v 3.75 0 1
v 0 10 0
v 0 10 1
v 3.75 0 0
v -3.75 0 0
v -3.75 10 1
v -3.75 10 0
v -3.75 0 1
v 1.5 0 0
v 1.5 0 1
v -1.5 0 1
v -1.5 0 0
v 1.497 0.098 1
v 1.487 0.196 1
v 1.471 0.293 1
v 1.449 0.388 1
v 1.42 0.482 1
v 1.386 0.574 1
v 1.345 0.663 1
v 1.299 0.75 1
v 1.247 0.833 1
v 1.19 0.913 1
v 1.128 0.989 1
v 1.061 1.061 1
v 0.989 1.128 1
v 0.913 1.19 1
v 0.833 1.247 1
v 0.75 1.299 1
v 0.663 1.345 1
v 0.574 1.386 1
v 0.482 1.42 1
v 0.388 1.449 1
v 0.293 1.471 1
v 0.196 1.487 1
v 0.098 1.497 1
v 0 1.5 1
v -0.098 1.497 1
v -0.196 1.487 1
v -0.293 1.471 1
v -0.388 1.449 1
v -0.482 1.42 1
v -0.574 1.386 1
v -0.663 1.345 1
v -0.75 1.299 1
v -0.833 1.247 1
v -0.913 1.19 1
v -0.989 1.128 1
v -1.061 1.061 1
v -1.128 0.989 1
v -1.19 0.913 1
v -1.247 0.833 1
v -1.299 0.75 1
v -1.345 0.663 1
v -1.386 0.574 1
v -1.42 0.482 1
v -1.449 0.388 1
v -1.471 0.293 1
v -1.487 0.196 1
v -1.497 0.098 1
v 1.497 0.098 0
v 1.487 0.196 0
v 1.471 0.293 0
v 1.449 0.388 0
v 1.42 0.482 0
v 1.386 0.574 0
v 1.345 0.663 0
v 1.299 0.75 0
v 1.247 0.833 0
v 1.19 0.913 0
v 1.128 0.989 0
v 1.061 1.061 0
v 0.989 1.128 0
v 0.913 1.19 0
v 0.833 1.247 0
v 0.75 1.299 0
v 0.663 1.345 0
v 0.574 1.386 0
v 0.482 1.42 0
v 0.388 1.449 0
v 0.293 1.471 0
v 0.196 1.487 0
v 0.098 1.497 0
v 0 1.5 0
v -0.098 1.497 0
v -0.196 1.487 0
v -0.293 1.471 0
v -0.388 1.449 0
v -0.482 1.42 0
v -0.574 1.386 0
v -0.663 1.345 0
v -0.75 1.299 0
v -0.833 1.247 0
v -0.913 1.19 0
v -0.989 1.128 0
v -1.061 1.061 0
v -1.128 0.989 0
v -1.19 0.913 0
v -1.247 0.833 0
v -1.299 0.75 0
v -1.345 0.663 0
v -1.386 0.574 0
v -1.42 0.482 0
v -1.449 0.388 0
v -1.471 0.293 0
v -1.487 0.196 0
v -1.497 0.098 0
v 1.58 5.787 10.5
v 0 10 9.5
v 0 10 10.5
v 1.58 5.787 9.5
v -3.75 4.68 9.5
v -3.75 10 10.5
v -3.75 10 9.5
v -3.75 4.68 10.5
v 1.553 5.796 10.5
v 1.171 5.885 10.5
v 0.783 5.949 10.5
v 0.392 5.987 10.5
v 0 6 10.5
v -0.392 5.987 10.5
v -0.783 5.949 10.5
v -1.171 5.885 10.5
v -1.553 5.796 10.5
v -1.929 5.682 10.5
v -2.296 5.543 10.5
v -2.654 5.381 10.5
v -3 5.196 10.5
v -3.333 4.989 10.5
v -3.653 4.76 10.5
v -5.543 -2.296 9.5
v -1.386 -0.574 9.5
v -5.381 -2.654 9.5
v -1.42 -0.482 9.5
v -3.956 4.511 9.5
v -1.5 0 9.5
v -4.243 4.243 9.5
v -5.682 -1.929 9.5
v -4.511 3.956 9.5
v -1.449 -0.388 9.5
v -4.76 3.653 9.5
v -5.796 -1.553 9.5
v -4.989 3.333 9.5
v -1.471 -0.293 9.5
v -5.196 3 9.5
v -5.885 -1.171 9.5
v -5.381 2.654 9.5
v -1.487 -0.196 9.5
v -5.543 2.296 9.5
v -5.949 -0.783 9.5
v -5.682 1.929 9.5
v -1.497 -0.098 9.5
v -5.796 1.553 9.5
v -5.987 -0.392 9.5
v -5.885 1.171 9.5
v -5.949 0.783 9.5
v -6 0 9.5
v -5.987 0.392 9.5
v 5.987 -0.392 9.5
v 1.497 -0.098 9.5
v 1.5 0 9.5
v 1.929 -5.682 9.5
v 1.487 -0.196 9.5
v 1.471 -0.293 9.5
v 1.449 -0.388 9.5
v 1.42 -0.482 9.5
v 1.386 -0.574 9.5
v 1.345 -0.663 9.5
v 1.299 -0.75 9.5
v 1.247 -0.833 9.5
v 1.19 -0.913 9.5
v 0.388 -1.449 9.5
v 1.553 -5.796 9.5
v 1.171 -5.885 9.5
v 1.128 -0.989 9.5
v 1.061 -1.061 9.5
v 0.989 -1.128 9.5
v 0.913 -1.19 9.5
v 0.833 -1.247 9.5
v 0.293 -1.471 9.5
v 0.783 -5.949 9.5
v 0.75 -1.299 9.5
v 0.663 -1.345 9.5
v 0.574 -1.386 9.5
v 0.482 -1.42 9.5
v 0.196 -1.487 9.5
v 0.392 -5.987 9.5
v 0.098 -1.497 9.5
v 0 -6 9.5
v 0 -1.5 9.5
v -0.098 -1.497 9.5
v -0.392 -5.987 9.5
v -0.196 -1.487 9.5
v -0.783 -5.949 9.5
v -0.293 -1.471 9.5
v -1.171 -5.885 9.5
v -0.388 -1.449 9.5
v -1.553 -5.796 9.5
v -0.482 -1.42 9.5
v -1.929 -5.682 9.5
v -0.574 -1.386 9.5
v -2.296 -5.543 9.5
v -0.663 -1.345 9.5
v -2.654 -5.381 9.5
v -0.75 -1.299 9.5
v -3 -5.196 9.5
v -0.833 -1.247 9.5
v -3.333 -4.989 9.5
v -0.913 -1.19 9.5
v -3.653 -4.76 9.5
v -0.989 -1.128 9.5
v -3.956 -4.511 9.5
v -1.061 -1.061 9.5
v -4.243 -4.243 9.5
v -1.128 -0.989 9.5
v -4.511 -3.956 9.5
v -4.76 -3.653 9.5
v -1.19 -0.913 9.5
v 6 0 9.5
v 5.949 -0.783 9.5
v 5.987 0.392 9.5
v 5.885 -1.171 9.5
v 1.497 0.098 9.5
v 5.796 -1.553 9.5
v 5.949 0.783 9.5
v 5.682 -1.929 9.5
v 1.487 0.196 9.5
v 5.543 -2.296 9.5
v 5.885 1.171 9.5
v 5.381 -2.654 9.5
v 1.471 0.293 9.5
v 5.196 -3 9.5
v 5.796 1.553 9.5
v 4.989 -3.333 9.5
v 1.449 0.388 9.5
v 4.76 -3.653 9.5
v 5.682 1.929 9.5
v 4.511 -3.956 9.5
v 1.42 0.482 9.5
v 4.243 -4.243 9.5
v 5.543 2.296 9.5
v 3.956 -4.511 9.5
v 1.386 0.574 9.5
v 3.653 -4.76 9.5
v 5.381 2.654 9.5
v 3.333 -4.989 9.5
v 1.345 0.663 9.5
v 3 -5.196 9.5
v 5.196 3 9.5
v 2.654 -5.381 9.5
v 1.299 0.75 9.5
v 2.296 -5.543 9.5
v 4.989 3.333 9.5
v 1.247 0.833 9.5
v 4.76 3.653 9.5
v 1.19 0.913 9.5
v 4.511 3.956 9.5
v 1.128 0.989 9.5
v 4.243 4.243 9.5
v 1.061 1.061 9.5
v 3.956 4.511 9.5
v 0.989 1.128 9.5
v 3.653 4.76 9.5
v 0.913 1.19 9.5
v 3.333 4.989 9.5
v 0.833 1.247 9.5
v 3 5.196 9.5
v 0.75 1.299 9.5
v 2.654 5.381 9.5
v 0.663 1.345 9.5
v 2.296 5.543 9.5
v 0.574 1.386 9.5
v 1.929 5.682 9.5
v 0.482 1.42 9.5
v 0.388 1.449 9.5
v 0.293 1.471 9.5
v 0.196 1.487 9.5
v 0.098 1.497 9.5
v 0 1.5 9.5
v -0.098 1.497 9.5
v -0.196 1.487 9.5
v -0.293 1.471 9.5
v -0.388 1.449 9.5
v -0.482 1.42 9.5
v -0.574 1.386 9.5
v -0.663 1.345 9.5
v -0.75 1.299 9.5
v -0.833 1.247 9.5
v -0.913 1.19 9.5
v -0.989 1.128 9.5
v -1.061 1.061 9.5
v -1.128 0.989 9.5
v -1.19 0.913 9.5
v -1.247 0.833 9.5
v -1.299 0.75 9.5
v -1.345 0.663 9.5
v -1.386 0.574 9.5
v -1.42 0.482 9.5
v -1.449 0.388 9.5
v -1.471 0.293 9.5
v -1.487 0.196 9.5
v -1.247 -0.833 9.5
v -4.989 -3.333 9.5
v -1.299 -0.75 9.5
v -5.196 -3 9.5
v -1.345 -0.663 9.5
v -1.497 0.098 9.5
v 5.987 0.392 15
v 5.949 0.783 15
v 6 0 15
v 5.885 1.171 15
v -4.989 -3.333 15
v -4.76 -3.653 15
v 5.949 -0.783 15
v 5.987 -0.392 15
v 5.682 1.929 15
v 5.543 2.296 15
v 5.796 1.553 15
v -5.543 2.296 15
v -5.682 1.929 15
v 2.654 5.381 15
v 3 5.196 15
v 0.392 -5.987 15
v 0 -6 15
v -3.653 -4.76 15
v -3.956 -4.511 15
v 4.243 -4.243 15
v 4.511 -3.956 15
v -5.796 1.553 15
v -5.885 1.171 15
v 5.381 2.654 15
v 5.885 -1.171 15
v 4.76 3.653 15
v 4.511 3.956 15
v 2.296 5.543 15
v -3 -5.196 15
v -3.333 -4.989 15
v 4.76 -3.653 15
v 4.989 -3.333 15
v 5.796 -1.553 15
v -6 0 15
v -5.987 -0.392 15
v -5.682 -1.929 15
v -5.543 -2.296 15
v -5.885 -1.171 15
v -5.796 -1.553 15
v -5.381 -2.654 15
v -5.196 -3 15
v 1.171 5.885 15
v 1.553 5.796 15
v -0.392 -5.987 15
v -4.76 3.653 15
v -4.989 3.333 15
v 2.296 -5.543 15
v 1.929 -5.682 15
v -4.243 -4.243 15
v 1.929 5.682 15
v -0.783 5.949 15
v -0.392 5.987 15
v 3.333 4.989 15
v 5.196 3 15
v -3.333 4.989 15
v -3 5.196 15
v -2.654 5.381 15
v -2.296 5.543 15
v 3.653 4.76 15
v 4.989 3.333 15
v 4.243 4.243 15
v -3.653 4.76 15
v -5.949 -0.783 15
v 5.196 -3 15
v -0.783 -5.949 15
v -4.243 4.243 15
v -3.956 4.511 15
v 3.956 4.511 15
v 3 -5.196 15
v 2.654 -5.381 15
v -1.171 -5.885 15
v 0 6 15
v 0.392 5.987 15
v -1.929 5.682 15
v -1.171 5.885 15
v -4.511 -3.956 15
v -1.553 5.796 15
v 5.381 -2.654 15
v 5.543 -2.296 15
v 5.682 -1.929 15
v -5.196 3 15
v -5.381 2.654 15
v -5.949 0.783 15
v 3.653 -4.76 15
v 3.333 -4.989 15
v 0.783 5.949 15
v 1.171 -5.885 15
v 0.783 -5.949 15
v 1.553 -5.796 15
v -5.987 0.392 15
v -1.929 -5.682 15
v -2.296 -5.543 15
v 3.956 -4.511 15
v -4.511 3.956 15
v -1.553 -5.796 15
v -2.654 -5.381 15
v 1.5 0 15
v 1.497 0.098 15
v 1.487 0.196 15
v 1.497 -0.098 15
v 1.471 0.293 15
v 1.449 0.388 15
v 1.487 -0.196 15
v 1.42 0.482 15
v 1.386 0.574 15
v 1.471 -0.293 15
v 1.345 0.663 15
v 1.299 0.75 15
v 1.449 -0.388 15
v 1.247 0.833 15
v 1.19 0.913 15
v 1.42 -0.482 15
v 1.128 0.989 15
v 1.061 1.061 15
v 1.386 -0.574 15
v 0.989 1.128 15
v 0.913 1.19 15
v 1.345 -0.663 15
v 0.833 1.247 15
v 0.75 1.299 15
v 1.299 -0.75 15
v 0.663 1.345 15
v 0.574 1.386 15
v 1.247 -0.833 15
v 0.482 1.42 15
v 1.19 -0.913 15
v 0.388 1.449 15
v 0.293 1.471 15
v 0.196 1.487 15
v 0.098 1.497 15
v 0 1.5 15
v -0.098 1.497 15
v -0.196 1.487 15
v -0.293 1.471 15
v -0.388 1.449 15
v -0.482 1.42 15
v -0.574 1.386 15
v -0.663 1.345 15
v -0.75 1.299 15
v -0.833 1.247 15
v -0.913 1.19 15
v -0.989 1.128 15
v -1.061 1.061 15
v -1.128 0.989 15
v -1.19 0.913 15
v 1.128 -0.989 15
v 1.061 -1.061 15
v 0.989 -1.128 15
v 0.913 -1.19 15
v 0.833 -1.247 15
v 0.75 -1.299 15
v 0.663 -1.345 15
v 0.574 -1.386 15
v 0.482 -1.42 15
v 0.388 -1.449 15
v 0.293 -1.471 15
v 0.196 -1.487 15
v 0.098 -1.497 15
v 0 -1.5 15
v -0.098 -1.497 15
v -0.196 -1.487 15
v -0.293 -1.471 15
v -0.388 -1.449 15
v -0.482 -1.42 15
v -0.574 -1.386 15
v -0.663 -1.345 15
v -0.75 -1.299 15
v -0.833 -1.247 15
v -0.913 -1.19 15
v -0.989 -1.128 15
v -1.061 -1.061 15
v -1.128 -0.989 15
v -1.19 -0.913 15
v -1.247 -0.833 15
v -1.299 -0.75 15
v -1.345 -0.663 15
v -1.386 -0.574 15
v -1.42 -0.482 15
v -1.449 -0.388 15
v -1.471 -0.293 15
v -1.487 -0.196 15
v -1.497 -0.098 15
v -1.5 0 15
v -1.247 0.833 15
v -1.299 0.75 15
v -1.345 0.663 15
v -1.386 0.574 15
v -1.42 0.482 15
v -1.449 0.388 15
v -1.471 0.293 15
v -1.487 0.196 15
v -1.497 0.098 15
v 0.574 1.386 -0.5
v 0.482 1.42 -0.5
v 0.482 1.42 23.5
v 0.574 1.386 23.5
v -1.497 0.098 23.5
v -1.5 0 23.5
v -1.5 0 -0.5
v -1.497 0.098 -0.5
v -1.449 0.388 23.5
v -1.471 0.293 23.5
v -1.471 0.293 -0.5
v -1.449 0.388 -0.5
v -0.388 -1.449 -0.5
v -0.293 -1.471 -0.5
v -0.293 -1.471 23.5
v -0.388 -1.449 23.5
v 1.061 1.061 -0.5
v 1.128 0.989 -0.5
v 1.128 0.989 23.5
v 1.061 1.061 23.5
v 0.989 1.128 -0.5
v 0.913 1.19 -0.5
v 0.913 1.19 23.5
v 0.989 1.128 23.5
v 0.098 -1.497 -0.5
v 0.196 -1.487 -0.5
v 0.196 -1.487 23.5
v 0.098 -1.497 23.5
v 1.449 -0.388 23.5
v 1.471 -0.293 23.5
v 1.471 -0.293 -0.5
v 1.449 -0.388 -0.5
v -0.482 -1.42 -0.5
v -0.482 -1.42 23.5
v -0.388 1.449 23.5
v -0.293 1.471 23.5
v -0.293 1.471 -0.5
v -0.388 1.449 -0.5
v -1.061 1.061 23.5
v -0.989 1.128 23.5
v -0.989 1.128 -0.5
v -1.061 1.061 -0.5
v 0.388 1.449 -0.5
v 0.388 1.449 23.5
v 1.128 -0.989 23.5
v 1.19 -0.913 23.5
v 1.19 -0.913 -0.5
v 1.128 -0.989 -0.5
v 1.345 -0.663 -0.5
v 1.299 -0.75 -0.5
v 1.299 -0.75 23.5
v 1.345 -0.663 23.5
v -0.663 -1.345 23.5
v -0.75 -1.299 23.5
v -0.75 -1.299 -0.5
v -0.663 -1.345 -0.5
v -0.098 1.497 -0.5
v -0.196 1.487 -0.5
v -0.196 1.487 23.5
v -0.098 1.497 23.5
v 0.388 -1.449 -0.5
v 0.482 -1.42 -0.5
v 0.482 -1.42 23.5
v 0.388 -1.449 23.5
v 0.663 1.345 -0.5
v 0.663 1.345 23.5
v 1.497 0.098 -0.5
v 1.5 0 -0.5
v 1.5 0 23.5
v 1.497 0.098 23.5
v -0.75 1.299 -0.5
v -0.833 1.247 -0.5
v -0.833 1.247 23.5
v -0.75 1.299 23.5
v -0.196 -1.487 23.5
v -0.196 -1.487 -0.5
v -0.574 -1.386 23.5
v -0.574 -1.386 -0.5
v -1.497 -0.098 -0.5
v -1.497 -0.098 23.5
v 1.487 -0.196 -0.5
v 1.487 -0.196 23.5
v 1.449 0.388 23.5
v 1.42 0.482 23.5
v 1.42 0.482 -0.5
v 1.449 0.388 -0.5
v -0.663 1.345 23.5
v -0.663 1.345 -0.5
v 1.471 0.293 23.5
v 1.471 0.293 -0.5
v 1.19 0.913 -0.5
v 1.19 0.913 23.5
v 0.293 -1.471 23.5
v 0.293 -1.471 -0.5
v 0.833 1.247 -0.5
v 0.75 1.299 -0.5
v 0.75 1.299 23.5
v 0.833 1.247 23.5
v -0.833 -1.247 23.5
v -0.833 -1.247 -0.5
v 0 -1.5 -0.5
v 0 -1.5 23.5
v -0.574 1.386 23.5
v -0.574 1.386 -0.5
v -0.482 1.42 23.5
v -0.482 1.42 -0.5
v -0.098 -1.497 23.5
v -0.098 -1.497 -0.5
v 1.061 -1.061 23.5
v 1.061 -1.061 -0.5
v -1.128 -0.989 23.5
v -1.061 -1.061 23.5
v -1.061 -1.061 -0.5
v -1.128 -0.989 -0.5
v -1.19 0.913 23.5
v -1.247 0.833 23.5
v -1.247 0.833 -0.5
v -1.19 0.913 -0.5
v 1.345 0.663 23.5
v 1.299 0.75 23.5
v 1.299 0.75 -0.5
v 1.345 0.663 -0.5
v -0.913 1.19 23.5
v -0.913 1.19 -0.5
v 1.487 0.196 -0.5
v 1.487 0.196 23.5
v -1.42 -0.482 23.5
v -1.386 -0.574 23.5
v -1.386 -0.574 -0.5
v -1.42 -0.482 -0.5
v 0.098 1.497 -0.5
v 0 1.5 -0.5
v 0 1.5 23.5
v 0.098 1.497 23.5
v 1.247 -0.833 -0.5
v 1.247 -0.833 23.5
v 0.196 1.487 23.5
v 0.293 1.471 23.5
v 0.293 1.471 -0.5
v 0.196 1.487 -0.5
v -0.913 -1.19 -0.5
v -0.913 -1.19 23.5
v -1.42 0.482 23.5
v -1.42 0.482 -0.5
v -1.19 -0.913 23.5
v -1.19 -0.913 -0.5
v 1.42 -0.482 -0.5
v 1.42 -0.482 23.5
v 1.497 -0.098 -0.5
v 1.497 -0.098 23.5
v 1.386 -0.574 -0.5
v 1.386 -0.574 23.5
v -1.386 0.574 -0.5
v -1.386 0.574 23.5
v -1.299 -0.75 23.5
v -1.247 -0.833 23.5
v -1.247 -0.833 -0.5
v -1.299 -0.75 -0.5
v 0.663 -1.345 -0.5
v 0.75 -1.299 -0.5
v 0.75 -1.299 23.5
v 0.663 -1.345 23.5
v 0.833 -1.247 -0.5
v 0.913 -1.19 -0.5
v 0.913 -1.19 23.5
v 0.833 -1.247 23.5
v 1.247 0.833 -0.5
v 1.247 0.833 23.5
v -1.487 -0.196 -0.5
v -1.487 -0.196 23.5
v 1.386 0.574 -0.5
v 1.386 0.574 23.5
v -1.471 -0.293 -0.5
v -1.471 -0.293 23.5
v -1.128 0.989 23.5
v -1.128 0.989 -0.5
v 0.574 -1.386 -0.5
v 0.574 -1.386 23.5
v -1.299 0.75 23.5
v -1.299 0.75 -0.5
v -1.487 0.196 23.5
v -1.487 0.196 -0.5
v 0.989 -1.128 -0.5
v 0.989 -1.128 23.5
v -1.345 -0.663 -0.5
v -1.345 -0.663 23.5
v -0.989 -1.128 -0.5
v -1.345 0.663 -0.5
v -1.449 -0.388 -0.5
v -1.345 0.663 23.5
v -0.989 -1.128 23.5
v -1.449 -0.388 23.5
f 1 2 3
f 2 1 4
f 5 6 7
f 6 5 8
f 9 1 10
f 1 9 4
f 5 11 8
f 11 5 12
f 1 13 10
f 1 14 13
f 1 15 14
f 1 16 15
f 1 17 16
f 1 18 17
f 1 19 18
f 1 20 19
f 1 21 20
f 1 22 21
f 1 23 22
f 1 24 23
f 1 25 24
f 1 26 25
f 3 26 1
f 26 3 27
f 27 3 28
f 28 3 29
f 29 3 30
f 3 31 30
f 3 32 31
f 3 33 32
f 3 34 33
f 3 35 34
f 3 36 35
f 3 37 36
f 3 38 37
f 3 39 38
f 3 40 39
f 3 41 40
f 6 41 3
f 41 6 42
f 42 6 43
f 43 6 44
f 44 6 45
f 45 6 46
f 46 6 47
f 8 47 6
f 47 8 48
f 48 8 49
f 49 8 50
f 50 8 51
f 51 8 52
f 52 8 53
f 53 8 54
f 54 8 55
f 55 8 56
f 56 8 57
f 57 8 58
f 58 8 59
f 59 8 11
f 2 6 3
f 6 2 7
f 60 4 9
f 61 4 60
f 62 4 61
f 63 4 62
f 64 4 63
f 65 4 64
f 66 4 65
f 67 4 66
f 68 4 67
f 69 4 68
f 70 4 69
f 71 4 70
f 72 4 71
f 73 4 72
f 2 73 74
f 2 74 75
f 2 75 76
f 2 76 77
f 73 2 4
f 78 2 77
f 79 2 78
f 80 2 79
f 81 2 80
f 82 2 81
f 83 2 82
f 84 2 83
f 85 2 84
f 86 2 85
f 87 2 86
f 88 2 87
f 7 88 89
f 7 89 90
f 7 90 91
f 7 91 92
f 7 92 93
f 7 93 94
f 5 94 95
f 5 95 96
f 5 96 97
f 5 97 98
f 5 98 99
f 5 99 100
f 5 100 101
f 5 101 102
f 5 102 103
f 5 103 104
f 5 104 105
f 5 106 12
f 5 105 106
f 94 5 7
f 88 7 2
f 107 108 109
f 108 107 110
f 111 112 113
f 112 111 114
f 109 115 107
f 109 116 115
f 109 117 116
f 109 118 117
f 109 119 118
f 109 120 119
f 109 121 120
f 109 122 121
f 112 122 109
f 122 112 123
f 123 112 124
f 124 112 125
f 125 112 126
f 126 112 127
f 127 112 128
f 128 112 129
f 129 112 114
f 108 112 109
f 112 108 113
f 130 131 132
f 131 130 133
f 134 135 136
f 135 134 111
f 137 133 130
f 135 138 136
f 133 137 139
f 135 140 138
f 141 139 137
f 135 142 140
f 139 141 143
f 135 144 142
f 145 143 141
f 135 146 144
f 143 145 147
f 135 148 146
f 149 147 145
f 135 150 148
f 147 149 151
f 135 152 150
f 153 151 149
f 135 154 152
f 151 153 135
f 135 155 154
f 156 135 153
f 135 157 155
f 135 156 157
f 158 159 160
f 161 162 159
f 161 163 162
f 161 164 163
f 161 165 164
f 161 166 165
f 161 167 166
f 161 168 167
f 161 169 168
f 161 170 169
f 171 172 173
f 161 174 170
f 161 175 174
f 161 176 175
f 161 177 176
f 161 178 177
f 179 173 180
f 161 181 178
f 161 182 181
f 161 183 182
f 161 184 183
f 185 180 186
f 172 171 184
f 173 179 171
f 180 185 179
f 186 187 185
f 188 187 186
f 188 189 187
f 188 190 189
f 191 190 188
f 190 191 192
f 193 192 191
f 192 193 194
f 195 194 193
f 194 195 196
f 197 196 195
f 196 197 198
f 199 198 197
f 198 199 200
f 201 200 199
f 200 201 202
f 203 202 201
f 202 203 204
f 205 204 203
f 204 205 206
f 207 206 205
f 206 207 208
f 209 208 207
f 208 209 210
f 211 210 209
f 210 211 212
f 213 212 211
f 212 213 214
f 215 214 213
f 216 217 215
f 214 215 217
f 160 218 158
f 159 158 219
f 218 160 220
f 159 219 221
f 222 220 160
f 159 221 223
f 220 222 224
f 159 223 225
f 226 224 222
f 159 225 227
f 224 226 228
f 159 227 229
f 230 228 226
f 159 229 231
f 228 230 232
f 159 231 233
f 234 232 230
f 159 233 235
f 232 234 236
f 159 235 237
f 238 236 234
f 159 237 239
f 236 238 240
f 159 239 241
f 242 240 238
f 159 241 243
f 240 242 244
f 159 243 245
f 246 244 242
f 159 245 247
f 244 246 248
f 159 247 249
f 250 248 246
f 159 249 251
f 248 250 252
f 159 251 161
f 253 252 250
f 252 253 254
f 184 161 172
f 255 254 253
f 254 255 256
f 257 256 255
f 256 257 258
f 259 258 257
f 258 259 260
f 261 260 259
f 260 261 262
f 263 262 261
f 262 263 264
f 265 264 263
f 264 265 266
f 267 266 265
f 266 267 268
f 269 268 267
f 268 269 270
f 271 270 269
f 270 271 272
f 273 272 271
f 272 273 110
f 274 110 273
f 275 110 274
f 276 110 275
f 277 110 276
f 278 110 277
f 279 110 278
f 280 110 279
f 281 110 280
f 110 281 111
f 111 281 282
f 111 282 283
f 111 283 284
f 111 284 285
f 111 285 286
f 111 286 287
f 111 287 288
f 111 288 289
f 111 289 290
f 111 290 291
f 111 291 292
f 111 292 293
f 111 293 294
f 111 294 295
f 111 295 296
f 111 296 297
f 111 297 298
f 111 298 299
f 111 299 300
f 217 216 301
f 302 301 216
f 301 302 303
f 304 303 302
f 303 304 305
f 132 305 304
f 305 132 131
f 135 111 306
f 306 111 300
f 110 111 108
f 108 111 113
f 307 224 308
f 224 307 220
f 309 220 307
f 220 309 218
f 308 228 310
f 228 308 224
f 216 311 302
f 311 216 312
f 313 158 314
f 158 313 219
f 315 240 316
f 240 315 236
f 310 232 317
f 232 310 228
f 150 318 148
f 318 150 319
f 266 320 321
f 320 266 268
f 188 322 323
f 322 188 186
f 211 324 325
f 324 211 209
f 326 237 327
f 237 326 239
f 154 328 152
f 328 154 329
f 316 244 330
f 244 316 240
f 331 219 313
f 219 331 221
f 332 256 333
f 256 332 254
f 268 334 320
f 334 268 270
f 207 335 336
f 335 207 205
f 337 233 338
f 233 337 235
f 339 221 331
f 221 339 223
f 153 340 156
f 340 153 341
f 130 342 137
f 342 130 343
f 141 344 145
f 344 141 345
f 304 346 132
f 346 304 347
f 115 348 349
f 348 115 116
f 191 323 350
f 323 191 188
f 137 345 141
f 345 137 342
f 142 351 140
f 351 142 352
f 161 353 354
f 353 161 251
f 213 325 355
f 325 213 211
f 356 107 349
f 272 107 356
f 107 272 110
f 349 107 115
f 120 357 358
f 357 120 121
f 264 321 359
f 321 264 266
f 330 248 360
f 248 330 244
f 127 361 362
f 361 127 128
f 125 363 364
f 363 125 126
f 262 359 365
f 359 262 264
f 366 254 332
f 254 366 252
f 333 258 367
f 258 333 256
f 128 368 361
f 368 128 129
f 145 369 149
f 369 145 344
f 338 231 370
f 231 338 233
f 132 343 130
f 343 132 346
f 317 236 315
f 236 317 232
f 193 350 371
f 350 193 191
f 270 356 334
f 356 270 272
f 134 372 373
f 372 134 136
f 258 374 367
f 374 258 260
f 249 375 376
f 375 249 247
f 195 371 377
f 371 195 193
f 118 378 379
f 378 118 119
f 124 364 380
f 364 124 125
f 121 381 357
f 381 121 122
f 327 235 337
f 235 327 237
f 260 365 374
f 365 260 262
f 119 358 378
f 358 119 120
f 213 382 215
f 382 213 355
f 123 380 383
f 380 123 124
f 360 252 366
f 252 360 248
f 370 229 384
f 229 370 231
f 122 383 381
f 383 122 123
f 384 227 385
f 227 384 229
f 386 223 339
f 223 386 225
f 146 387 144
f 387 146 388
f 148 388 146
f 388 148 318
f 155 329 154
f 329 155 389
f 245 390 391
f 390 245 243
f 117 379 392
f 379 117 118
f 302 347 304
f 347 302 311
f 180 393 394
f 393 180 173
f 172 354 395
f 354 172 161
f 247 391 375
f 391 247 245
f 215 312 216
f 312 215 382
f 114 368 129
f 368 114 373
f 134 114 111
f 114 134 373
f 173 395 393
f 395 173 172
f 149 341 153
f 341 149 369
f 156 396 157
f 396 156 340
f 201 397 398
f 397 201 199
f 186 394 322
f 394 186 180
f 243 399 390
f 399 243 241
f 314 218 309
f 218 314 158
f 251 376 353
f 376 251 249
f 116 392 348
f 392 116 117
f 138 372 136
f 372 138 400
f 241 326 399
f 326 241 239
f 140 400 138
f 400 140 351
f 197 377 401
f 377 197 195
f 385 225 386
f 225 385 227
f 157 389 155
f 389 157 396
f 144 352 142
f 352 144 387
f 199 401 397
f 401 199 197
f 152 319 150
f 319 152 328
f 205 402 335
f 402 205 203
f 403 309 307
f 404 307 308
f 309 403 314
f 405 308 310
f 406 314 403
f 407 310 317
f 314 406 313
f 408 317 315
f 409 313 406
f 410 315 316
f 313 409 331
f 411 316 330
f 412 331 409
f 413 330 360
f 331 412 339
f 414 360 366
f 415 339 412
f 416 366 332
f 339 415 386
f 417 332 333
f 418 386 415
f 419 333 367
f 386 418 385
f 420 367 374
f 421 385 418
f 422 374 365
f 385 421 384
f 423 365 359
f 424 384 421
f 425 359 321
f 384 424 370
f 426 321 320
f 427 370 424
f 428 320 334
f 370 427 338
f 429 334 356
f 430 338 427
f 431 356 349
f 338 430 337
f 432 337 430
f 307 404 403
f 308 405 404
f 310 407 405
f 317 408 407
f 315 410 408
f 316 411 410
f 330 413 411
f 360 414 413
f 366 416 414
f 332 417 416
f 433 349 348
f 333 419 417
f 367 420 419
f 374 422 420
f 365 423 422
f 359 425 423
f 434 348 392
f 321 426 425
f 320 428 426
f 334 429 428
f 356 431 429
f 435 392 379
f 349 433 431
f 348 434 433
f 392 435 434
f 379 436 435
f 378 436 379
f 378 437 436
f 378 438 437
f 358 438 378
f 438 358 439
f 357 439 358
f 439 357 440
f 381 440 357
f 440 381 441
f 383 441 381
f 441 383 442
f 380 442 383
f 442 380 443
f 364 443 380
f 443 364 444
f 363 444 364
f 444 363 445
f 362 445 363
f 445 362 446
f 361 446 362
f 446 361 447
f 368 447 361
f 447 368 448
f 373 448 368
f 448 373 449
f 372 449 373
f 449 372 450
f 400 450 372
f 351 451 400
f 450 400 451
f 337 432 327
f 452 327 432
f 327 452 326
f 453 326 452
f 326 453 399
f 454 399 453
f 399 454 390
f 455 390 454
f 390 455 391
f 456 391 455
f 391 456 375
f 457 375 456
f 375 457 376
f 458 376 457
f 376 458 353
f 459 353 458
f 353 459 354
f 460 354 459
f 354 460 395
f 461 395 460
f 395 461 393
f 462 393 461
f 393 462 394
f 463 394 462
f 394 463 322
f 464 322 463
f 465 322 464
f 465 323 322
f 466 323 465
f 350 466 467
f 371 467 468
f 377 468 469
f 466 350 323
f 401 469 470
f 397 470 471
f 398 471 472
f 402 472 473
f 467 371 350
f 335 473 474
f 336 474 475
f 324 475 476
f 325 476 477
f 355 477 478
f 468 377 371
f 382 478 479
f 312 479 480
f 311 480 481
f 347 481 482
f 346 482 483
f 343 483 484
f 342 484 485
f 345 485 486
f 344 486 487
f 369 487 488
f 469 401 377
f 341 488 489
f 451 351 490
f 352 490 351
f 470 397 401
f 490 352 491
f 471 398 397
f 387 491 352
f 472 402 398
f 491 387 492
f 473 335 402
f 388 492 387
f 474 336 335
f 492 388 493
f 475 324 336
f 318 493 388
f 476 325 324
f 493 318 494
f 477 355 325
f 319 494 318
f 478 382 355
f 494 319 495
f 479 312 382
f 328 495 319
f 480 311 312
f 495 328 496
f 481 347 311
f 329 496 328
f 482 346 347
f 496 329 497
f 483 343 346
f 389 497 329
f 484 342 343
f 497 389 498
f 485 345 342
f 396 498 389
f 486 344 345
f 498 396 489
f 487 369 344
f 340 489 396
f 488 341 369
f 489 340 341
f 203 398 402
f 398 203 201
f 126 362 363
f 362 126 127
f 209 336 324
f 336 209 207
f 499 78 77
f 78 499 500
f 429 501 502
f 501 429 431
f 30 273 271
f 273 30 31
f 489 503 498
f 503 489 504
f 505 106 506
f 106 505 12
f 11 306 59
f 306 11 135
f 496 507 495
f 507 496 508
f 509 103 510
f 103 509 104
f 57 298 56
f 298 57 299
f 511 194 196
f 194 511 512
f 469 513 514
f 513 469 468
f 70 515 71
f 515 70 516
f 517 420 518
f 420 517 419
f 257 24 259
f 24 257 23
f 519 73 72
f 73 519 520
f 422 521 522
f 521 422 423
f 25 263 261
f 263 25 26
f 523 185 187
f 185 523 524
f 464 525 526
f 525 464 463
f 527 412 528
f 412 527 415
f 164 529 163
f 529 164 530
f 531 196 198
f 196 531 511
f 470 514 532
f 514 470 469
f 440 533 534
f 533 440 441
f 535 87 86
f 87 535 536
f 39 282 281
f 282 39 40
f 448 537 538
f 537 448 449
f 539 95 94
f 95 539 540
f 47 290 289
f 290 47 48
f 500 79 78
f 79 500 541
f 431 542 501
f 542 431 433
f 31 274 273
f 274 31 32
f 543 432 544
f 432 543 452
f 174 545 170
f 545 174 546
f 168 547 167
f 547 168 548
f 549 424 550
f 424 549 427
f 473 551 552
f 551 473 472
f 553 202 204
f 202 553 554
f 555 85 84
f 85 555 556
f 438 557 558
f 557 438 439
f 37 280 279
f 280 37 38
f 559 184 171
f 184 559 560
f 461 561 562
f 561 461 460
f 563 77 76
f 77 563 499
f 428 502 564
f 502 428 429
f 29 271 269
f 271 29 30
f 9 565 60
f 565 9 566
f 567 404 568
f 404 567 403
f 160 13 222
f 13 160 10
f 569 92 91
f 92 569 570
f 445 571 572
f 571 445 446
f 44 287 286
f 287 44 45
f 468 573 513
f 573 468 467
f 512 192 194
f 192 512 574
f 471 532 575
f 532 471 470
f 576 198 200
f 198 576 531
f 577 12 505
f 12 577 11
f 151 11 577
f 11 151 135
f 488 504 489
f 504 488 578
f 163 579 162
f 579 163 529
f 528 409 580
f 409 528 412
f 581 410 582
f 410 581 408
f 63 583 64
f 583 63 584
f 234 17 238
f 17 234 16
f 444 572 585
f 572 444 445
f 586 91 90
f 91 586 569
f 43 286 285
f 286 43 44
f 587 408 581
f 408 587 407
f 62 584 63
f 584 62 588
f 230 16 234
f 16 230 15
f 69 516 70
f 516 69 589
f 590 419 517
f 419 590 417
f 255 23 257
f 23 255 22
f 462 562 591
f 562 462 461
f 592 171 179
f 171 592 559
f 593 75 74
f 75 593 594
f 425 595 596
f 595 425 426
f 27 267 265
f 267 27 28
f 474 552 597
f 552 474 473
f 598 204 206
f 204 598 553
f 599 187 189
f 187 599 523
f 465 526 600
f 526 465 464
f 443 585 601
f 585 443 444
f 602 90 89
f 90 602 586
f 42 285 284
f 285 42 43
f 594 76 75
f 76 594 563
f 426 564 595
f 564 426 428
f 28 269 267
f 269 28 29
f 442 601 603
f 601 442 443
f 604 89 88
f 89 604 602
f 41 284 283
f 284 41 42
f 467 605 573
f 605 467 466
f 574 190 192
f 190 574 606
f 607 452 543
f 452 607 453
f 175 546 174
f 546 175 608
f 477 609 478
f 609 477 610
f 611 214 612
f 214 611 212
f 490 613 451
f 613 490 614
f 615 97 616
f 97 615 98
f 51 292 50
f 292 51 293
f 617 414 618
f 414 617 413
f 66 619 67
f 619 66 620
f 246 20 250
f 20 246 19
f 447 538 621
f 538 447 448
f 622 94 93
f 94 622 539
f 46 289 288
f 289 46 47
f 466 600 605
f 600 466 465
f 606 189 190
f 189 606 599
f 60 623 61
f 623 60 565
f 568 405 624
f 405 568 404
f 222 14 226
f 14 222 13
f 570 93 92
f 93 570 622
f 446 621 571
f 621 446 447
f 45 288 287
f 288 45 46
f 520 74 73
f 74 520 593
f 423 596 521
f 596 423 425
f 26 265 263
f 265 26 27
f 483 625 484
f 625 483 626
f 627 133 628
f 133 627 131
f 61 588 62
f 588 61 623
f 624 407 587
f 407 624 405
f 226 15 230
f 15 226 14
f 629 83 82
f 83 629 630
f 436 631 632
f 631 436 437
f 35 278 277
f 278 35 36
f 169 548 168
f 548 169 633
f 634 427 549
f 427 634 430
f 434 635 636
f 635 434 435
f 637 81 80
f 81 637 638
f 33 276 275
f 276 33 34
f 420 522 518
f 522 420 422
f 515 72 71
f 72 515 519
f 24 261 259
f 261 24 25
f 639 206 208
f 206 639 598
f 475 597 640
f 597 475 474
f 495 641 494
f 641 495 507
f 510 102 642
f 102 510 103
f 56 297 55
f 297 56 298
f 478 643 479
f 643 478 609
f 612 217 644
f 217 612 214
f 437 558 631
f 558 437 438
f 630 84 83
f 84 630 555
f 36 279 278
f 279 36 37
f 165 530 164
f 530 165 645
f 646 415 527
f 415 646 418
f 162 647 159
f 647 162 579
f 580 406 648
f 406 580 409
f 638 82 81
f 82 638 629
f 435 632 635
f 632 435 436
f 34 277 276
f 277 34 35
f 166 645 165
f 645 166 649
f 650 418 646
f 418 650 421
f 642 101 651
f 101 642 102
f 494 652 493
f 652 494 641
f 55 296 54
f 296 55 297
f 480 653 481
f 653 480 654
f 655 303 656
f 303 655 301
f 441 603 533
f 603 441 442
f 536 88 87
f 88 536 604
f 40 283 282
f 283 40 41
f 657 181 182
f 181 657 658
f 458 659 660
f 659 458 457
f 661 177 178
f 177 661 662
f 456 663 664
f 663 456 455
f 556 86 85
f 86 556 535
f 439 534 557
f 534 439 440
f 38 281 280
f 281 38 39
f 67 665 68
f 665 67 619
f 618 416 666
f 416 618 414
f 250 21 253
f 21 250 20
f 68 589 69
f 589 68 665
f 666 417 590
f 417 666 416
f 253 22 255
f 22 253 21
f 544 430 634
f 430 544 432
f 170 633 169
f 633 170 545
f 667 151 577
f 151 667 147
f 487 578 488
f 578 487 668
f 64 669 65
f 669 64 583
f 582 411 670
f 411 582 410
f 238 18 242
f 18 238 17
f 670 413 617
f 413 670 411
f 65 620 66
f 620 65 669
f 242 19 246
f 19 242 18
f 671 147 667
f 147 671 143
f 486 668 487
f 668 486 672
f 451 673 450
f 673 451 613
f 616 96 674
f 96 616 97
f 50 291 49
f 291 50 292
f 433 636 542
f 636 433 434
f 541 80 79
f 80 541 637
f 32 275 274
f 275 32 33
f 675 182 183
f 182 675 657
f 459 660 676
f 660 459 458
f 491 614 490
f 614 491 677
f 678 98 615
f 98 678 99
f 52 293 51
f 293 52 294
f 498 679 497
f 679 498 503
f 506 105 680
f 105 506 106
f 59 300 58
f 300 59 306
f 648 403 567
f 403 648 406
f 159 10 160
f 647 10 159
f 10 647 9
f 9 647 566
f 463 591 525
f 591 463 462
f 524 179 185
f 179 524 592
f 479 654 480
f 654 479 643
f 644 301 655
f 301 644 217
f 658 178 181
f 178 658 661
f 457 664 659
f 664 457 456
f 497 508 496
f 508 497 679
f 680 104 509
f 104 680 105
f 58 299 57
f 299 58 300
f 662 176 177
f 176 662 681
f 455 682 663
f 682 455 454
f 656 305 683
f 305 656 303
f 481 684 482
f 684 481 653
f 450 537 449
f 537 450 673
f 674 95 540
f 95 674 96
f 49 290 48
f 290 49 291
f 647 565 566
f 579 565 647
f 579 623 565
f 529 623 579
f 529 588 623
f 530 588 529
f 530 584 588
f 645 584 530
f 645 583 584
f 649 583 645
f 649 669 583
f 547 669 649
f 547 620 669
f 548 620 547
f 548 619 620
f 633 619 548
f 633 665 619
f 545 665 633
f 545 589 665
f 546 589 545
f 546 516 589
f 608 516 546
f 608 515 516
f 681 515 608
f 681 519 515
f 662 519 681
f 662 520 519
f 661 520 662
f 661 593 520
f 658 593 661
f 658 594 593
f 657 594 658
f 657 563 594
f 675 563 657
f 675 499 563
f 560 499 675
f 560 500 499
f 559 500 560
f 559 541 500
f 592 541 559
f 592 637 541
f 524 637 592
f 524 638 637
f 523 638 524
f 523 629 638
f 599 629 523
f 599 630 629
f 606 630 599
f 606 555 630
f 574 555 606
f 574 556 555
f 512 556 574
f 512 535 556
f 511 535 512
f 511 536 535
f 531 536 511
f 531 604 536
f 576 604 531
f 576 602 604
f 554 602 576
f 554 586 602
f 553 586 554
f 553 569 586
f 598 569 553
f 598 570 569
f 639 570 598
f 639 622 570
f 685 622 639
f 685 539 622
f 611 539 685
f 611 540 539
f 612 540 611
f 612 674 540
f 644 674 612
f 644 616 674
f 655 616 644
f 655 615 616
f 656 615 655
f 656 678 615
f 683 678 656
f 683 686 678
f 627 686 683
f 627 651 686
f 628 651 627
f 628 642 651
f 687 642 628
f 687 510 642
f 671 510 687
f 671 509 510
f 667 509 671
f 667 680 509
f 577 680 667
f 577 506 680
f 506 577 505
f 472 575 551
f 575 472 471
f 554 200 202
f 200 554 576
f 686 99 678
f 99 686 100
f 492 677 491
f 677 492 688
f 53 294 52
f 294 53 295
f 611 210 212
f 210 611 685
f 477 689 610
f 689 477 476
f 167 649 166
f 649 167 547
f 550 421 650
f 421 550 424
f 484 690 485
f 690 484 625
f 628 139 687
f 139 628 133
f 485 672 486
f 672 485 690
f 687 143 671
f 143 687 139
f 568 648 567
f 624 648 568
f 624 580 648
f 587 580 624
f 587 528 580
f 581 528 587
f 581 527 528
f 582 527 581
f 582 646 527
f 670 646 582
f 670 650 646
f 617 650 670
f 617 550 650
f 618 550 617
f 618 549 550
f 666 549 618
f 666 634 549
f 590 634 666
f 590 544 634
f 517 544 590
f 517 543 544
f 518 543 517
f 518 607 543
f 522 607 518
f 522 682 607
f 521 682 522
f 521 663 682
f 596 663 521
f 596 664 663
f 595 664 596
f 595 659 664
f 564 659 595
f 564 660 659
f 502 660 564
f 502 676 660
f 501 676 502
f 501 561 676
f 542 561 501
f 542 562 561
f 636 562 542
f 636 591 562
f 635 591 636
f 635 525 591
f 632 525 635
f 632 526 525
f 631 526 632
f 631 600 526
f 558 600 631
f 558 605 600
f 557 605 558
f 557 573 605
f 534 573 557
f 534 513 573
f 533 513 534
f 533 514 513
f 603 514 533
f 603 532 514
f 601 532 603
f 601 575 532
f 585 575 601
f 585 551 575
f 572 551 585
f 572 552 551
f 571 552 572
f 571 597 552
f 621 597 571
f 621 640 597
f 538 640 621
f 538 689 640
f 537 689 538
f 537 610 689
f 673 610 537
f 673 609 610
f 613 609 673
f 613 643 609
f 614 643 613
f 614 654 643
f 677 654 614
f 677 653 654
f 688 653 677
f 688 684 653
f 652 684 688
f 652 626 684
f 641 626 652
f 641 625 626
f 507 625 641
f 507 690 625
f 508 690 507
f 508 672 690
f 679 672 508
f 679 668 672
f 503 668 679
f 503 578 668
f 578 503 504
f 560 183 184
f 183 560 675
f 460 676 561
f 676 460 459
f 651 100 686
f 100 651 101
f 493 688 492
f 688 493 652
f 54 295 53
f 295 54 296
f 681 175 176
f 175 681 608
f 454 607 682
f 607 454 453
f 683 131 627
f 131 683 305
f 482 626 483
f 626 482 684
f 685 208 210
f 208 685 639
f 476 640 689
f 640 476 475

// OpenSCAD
// Hose-barb reducer: 8 mm ID tubing to 5 mm ID tubing
// Print orientation: standing upright along Z

$fn = 96;

// ---- Dimensions (mm) ----
barb8_od_b     = 7.5;   // 8 mm barb outer diameter (bottom)
barb8_od_t     = 9.5;   // 8 mm barb outer diameter (top)
barb8_h        = 10;    // 8 mm barb height
barb5_od_b     = 6.5;   // 5 mm barb outer diameter (bottom)
barb5_od_t     = 5.0;   // 5 mm barb outer diameter (top)
barb5_h        = 8;     // 5 mm barb height
collar_d       = 12;    // collar diameter
collar_h       = 5;     // collar height
bore_d         = 3;     // through-bore diameter
overlap        = 0.5;   // overlap for joined bodies
cut_ext       = 0.5;    // cutter extension past faces

total_h = barb8_h + collar_h + barb5_h;  // 23 mm overall

// ---- Model ----
union() {
    // 8 mm barbs: sawtooth profile, stacked
    for (i = [0 : 1])
        translate([0, 0, i * barb8_h - (i ? overlap : 0)])
            linear_extrude(height = 1)
                polygon([[-barb8_od_b / 2, 0], [barb8_od_b / 2, 0], [0, barb8_h], [-barb8_od_b / 2, barb8_h]]);

    // Collar
    translate([0, 0, barb8_h - overlap])
        cylinder(d = collar_d, h = collar_h + overlap);

    // 5 mm barbs: shrinking profile, stacked
    for (i = [0 : 1])
        translate([0, 0, i * barb5_h - (i ? overlap : 0)])
            linear_extrude(height = 1)
                polygon([[-barb5_od_b / 2, 0], [barb5_od_b / 2, 0], [0, barb5_h], [-barb5_od_t / 2, barb5_h], [barb5_od_t / 2, barb5_h]]);
}

difference() {
    // Bore, through full length
    translate([0, 0, -cut_ext])
        cylinder(d = bore_d, h = total_h + 2 * cut_ext);

    // Clean up the overlap region so it is not coplanar with neighbouring faces
    translate([0, 0, barb8_h - 0.25])
        cylinder(d = collar_d + 1, h = 1);
}
